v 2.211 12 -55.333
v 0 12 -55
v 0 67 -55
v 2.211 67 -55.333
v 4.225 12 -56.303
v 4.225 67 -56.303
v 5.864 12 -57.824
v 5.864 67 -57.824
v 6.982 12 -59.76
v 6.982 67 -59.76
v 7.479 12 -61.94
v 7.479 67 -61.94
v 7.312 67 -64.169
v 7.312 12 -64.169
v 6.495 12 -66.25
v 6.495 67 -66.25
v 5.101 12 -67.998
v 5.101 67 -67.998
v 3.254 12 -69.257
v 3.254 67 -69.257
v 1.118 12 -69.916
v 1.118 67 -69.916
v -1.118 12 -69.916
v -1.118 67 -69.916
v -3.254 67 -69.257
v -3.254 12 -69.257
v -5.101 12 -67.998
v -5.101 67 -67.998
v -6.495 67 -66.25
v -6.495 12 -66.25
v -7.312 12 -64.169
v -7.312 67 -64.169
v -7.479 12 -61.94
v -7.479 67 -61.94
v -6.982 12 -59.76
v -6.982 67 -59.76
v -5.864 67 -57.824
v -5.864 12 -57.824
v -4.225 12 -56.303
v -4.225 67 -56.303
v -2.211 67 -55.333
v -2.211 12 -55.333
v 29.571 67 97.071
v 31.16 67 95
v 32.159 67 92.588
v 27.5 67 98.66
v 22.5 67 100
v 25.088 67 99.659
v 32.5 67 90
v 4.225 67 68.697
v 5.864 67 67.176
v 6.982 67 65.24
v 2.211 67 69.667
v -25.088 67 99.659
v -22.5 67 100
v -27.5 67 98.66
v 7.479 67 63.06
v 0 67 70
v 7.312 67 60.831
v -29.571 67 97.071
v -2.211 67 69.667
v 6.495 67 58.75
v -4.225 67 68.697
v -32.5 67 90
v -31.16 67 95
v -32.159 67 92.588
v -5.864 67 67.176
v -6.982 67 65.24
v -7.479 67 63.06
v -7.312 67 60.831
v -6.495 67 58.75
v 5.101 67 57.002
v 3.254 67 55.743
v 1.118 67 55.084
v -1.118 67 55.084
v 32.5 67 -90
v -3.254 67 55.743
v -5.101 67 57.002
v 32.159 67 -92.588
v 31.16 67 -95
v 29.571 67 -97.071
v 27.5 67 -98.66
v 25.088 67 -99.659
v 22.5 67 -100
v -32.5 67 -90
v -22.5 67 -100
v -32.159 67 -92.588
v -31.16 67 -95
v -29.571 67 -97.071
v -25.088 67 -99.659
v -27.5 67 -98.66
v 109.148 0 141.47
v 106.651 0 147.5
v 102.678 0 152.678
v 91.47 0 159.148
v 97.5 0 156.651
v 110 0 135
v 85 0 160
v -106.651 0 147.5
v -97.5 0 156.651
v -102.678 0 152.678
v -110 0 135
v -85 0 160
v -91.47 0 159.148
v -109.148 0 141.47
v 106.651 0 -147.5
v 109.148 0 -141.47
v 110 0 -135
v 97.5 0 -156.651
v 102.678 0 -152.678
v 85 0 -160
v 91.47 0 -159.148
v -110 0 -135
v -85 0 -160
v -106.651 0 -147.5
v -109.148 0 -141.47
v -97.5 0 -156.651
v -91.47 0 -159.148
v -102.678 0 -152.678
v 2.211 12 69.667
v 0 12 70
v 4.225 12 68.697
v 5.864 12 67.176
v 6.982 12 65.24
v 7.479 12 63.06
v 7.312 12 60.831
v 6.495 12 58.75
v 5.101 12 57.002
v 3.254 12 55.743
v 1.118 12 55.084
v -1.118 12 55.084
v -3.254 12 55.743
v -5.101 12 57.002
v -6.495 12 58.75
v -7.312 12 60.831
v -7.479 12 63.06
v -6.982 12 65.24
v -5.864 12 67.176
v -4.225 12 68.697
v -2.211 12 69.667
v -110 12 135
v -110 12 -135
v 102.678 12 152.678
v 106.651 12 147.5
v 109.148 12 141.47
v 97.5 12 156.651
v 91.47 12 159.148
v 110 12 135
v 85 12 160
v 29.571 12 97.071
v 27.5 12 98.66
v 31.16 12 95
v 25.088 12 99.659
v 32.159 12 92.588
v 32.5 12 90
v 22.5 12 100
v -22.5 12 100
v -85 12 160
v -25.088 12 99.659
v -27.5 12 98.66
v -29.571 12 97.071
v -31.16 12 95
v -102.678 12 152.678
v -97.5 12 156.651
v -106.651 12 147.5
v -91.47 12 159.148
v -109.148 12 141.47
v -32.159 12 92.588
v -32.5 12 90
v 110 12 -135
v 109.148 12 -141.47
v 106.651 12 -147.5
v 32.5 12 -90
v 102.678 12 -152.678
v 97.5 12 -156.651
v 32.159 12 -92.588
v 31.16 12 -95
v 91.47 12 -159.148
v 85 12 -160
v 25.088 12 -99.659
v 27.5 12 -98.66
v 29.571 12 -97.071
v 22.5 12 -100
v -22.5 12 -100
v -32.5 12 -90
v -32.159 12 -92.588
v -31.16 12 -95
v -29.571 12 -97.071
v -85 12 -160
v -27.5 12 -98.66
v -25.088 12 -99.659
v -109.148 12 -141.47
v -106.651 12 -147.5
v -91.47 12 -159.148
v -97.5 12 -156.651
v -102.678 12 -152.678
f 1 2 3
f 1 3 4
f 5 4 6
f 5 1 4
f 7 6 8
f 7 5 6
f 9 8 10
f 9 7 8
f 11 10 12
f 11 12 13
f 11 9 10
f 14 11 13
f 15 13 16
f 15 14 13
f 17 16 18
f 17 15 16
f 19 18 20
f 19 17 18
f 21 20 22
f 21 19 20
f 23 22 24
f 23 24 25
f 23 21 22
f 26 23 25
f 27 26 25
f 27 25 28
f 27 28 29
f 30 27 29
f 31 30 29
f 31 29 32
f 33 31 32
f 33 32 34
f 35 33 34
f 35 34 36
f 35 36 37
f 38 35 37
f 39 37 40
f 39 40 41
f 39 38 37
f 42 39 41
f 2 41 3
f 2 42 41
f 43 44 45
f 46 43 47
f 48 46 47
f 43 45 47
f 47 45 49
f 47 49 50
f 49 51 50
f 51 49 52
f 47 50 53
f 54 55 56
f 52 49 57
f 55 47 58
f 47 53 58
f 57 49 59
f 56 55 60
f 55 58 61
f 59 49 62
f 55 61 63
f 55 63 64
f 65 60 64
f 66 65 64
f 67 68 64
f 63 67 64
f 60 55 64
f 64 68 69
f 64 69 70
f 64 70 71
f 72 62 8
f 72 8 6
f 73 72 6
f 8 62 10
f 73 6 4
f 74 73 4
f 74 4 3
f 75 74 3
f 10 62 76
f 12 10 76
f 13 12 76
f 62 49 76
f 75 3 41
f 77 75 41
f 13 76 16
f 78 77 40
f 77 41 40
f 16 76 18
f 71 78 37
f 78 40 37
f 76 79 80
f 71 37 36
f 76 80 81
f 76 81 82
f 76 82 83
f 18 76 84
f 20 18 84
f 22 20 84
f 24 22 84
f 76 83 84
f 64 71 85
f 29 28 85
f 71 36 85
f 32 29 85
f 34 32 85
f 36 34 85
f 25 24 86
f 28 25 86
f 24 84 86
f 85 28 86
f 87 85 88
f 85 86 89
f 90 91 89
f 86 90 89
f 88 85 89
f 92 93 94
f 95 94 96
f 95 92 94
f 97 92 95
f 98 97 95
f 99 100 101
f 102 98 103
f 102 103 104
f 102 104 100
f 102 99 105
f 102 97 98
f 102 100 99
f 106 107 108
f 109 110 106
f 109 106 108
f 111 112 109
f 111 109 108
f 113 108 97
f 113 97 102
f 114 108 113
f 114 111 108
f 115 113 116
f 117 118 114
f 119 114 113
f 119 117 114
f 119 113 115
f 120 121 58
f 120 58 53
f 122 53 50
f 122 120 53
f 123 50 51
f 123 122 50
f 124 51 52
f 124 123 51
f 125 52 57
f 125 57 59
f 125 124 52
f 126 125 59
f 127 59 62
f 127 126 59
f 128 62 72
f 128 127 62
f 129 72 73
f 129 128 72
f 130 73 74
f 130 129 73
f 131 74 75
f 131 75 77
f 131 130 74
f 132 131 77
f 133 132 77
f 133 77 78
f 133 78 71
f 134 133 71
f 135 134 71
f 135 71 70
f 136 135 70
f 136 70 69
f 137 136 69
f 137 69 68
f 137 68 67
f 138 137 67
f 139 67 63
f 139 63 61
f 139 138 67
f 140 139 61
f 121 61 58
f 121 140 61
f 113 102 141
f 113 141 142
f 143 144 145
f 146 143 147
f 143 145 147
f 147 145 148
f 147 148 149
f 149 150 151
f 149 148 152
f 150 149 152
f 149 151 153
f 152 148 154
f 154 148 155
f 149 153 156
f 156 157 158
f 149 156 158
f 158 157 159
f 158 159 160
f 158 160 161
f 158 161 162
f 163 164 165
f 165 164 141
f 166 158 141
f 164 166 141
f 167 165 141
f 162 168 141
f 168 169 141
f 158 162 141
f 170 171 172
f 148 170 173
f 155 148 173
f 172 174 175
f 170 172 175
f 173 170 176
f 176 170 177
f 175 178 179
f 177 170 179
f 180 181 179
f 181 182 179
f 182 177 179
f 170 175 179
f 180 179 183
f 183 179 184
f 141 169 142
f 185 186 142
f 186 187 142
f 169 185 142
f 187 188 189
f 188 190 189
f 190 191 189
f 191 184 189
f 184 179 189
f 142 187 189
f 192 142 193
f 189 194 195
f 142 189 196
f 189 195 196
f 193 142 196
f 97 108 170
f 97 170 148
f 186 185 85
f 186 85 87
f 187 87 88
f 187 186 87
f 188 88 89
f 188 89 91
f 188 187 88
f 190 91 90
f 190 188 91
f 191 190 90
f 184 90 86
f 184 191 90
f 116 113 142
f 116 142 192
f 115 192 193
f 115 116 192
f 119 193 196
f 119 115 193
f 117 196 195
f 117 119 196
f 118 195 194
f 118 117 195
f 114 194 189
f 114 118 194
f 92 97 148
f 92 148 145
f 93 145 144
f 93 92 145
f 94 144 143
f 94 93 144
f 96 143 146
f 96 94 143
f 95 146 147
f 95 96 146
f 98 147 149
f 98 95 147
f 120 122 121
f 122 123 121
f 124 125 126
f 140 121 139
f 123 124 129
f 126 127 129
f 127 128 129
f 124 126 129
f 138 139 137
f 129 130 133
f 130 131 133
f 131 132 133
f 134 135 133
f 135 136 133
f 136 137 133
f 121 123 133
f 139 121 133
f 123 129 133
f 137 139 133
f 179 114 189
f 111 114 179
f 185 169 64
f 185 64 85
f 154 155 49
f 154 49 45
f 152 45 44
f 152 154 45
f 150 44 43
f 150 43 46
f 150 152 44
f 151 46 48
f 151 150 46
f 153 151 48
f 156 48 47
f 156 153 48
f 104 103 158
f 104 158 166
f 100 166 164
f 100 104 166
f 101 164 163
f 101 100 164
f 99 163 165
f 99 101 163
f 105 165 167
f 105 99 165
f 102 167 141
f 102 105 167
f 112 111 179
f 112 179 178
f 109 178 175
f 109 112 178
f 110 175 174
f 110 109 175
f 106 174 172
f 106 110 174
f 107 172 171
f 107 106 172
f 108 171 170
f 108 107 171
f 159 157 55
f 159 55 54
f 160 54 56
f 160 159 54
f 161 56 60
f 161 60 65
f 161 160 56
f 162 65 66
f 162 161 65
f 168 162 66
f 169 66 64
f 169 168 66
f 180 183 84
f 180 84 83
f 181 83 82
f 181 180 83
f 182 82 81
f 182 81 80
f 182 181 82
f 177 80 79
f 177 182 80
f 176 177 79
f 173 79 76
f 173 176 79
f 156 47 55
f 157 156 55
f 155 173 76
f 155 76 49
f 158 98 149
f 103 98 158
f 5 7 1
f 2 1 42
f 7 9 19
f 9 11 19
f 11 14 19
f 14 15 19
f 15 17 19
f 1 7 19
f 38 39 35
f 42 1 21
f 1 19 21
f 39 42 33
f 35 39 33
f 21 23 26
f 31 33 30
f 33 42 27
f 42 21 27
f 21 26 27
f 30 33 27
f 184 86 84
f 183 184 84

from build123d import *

# Parameters (mm, degrees)
BOSS_EXTRUDE1_DEPTH = 12
SKETCH2_R           = 7.5
BOSS_EXTRUDE2_DEPTH = 55


with BuildPart() as part:
    # Sketch1 → Boss-Extrude1 (new body)
    with BuildSketch(Plane(origin=(0, 0, 0), x_dir=(1, 0, 0), z_dir=(0, 1, 0))):
        with BuildLine():
            Line((-85, 160), (85, 160))
            ThreePointArc((85, 160), (102.67766953, 152.67766953), (110, 135))
            Line((110, 135), (110, -135))
            ThreePointArc((110, -135), (102.67766953, -152.67766953), (85, -160))
            Line((85, -160), (-85, -160))
            ThreePointArc((-85, -160), (-102.67766953, -152.67766953), (-110, -135))
            Line((-110, -135), (-110, 135))
            ThreePointArc((-110, 135), (-102.67766953, 152.67766953), (-85, 160))
        make_face()
    extrude(amount=BOSS_EXTRUDE1_DEPTH)

    # Sketch2 → Boss-Extrude2 (add)
    with BuildSketch(Plane(origin=(0, 12, 0), x_dir=(1, 0, 0), z_dir=(0, 1, 0))):
        with BuildLine():
            Line((-22.5, 100), (22.5, 100))
            ThreePointArc((22.5, 100), (29.571067812, 97.071067812), (32.5, 90))
            Line((32.5, 90), (32.5, -90))
            ThreePointArc((32.5, -90), (29.571067812, -97.071067812), (22.5, -100))
            Line((22.5, -100), (-22.5, -100))
            ThreePointArc((-22.5, -100), (-29.571067812, -97.071067812), (-32.5, -90))
            Line((-32.5, -90), (-32.5, 90))
            ThreePointArc((-32.5, 90), (-29.571067812, 97.071067812), (-22.5, 100))
        make_face()
        with Locations(Location((0, 62.5, 0), (0, 0, 270))):
            Circle(SKETCH2_R, mode=Mode.SUBTRACT)
        with Locations(Location((0, -62.5, 0), (0, 0, 270))):
            Circle(SKETCH2_R, mode=Mode.SUBTRACT)
    extrude(amount=BOSS_EXTRUDE2_DEPTH)


solid = part.part
